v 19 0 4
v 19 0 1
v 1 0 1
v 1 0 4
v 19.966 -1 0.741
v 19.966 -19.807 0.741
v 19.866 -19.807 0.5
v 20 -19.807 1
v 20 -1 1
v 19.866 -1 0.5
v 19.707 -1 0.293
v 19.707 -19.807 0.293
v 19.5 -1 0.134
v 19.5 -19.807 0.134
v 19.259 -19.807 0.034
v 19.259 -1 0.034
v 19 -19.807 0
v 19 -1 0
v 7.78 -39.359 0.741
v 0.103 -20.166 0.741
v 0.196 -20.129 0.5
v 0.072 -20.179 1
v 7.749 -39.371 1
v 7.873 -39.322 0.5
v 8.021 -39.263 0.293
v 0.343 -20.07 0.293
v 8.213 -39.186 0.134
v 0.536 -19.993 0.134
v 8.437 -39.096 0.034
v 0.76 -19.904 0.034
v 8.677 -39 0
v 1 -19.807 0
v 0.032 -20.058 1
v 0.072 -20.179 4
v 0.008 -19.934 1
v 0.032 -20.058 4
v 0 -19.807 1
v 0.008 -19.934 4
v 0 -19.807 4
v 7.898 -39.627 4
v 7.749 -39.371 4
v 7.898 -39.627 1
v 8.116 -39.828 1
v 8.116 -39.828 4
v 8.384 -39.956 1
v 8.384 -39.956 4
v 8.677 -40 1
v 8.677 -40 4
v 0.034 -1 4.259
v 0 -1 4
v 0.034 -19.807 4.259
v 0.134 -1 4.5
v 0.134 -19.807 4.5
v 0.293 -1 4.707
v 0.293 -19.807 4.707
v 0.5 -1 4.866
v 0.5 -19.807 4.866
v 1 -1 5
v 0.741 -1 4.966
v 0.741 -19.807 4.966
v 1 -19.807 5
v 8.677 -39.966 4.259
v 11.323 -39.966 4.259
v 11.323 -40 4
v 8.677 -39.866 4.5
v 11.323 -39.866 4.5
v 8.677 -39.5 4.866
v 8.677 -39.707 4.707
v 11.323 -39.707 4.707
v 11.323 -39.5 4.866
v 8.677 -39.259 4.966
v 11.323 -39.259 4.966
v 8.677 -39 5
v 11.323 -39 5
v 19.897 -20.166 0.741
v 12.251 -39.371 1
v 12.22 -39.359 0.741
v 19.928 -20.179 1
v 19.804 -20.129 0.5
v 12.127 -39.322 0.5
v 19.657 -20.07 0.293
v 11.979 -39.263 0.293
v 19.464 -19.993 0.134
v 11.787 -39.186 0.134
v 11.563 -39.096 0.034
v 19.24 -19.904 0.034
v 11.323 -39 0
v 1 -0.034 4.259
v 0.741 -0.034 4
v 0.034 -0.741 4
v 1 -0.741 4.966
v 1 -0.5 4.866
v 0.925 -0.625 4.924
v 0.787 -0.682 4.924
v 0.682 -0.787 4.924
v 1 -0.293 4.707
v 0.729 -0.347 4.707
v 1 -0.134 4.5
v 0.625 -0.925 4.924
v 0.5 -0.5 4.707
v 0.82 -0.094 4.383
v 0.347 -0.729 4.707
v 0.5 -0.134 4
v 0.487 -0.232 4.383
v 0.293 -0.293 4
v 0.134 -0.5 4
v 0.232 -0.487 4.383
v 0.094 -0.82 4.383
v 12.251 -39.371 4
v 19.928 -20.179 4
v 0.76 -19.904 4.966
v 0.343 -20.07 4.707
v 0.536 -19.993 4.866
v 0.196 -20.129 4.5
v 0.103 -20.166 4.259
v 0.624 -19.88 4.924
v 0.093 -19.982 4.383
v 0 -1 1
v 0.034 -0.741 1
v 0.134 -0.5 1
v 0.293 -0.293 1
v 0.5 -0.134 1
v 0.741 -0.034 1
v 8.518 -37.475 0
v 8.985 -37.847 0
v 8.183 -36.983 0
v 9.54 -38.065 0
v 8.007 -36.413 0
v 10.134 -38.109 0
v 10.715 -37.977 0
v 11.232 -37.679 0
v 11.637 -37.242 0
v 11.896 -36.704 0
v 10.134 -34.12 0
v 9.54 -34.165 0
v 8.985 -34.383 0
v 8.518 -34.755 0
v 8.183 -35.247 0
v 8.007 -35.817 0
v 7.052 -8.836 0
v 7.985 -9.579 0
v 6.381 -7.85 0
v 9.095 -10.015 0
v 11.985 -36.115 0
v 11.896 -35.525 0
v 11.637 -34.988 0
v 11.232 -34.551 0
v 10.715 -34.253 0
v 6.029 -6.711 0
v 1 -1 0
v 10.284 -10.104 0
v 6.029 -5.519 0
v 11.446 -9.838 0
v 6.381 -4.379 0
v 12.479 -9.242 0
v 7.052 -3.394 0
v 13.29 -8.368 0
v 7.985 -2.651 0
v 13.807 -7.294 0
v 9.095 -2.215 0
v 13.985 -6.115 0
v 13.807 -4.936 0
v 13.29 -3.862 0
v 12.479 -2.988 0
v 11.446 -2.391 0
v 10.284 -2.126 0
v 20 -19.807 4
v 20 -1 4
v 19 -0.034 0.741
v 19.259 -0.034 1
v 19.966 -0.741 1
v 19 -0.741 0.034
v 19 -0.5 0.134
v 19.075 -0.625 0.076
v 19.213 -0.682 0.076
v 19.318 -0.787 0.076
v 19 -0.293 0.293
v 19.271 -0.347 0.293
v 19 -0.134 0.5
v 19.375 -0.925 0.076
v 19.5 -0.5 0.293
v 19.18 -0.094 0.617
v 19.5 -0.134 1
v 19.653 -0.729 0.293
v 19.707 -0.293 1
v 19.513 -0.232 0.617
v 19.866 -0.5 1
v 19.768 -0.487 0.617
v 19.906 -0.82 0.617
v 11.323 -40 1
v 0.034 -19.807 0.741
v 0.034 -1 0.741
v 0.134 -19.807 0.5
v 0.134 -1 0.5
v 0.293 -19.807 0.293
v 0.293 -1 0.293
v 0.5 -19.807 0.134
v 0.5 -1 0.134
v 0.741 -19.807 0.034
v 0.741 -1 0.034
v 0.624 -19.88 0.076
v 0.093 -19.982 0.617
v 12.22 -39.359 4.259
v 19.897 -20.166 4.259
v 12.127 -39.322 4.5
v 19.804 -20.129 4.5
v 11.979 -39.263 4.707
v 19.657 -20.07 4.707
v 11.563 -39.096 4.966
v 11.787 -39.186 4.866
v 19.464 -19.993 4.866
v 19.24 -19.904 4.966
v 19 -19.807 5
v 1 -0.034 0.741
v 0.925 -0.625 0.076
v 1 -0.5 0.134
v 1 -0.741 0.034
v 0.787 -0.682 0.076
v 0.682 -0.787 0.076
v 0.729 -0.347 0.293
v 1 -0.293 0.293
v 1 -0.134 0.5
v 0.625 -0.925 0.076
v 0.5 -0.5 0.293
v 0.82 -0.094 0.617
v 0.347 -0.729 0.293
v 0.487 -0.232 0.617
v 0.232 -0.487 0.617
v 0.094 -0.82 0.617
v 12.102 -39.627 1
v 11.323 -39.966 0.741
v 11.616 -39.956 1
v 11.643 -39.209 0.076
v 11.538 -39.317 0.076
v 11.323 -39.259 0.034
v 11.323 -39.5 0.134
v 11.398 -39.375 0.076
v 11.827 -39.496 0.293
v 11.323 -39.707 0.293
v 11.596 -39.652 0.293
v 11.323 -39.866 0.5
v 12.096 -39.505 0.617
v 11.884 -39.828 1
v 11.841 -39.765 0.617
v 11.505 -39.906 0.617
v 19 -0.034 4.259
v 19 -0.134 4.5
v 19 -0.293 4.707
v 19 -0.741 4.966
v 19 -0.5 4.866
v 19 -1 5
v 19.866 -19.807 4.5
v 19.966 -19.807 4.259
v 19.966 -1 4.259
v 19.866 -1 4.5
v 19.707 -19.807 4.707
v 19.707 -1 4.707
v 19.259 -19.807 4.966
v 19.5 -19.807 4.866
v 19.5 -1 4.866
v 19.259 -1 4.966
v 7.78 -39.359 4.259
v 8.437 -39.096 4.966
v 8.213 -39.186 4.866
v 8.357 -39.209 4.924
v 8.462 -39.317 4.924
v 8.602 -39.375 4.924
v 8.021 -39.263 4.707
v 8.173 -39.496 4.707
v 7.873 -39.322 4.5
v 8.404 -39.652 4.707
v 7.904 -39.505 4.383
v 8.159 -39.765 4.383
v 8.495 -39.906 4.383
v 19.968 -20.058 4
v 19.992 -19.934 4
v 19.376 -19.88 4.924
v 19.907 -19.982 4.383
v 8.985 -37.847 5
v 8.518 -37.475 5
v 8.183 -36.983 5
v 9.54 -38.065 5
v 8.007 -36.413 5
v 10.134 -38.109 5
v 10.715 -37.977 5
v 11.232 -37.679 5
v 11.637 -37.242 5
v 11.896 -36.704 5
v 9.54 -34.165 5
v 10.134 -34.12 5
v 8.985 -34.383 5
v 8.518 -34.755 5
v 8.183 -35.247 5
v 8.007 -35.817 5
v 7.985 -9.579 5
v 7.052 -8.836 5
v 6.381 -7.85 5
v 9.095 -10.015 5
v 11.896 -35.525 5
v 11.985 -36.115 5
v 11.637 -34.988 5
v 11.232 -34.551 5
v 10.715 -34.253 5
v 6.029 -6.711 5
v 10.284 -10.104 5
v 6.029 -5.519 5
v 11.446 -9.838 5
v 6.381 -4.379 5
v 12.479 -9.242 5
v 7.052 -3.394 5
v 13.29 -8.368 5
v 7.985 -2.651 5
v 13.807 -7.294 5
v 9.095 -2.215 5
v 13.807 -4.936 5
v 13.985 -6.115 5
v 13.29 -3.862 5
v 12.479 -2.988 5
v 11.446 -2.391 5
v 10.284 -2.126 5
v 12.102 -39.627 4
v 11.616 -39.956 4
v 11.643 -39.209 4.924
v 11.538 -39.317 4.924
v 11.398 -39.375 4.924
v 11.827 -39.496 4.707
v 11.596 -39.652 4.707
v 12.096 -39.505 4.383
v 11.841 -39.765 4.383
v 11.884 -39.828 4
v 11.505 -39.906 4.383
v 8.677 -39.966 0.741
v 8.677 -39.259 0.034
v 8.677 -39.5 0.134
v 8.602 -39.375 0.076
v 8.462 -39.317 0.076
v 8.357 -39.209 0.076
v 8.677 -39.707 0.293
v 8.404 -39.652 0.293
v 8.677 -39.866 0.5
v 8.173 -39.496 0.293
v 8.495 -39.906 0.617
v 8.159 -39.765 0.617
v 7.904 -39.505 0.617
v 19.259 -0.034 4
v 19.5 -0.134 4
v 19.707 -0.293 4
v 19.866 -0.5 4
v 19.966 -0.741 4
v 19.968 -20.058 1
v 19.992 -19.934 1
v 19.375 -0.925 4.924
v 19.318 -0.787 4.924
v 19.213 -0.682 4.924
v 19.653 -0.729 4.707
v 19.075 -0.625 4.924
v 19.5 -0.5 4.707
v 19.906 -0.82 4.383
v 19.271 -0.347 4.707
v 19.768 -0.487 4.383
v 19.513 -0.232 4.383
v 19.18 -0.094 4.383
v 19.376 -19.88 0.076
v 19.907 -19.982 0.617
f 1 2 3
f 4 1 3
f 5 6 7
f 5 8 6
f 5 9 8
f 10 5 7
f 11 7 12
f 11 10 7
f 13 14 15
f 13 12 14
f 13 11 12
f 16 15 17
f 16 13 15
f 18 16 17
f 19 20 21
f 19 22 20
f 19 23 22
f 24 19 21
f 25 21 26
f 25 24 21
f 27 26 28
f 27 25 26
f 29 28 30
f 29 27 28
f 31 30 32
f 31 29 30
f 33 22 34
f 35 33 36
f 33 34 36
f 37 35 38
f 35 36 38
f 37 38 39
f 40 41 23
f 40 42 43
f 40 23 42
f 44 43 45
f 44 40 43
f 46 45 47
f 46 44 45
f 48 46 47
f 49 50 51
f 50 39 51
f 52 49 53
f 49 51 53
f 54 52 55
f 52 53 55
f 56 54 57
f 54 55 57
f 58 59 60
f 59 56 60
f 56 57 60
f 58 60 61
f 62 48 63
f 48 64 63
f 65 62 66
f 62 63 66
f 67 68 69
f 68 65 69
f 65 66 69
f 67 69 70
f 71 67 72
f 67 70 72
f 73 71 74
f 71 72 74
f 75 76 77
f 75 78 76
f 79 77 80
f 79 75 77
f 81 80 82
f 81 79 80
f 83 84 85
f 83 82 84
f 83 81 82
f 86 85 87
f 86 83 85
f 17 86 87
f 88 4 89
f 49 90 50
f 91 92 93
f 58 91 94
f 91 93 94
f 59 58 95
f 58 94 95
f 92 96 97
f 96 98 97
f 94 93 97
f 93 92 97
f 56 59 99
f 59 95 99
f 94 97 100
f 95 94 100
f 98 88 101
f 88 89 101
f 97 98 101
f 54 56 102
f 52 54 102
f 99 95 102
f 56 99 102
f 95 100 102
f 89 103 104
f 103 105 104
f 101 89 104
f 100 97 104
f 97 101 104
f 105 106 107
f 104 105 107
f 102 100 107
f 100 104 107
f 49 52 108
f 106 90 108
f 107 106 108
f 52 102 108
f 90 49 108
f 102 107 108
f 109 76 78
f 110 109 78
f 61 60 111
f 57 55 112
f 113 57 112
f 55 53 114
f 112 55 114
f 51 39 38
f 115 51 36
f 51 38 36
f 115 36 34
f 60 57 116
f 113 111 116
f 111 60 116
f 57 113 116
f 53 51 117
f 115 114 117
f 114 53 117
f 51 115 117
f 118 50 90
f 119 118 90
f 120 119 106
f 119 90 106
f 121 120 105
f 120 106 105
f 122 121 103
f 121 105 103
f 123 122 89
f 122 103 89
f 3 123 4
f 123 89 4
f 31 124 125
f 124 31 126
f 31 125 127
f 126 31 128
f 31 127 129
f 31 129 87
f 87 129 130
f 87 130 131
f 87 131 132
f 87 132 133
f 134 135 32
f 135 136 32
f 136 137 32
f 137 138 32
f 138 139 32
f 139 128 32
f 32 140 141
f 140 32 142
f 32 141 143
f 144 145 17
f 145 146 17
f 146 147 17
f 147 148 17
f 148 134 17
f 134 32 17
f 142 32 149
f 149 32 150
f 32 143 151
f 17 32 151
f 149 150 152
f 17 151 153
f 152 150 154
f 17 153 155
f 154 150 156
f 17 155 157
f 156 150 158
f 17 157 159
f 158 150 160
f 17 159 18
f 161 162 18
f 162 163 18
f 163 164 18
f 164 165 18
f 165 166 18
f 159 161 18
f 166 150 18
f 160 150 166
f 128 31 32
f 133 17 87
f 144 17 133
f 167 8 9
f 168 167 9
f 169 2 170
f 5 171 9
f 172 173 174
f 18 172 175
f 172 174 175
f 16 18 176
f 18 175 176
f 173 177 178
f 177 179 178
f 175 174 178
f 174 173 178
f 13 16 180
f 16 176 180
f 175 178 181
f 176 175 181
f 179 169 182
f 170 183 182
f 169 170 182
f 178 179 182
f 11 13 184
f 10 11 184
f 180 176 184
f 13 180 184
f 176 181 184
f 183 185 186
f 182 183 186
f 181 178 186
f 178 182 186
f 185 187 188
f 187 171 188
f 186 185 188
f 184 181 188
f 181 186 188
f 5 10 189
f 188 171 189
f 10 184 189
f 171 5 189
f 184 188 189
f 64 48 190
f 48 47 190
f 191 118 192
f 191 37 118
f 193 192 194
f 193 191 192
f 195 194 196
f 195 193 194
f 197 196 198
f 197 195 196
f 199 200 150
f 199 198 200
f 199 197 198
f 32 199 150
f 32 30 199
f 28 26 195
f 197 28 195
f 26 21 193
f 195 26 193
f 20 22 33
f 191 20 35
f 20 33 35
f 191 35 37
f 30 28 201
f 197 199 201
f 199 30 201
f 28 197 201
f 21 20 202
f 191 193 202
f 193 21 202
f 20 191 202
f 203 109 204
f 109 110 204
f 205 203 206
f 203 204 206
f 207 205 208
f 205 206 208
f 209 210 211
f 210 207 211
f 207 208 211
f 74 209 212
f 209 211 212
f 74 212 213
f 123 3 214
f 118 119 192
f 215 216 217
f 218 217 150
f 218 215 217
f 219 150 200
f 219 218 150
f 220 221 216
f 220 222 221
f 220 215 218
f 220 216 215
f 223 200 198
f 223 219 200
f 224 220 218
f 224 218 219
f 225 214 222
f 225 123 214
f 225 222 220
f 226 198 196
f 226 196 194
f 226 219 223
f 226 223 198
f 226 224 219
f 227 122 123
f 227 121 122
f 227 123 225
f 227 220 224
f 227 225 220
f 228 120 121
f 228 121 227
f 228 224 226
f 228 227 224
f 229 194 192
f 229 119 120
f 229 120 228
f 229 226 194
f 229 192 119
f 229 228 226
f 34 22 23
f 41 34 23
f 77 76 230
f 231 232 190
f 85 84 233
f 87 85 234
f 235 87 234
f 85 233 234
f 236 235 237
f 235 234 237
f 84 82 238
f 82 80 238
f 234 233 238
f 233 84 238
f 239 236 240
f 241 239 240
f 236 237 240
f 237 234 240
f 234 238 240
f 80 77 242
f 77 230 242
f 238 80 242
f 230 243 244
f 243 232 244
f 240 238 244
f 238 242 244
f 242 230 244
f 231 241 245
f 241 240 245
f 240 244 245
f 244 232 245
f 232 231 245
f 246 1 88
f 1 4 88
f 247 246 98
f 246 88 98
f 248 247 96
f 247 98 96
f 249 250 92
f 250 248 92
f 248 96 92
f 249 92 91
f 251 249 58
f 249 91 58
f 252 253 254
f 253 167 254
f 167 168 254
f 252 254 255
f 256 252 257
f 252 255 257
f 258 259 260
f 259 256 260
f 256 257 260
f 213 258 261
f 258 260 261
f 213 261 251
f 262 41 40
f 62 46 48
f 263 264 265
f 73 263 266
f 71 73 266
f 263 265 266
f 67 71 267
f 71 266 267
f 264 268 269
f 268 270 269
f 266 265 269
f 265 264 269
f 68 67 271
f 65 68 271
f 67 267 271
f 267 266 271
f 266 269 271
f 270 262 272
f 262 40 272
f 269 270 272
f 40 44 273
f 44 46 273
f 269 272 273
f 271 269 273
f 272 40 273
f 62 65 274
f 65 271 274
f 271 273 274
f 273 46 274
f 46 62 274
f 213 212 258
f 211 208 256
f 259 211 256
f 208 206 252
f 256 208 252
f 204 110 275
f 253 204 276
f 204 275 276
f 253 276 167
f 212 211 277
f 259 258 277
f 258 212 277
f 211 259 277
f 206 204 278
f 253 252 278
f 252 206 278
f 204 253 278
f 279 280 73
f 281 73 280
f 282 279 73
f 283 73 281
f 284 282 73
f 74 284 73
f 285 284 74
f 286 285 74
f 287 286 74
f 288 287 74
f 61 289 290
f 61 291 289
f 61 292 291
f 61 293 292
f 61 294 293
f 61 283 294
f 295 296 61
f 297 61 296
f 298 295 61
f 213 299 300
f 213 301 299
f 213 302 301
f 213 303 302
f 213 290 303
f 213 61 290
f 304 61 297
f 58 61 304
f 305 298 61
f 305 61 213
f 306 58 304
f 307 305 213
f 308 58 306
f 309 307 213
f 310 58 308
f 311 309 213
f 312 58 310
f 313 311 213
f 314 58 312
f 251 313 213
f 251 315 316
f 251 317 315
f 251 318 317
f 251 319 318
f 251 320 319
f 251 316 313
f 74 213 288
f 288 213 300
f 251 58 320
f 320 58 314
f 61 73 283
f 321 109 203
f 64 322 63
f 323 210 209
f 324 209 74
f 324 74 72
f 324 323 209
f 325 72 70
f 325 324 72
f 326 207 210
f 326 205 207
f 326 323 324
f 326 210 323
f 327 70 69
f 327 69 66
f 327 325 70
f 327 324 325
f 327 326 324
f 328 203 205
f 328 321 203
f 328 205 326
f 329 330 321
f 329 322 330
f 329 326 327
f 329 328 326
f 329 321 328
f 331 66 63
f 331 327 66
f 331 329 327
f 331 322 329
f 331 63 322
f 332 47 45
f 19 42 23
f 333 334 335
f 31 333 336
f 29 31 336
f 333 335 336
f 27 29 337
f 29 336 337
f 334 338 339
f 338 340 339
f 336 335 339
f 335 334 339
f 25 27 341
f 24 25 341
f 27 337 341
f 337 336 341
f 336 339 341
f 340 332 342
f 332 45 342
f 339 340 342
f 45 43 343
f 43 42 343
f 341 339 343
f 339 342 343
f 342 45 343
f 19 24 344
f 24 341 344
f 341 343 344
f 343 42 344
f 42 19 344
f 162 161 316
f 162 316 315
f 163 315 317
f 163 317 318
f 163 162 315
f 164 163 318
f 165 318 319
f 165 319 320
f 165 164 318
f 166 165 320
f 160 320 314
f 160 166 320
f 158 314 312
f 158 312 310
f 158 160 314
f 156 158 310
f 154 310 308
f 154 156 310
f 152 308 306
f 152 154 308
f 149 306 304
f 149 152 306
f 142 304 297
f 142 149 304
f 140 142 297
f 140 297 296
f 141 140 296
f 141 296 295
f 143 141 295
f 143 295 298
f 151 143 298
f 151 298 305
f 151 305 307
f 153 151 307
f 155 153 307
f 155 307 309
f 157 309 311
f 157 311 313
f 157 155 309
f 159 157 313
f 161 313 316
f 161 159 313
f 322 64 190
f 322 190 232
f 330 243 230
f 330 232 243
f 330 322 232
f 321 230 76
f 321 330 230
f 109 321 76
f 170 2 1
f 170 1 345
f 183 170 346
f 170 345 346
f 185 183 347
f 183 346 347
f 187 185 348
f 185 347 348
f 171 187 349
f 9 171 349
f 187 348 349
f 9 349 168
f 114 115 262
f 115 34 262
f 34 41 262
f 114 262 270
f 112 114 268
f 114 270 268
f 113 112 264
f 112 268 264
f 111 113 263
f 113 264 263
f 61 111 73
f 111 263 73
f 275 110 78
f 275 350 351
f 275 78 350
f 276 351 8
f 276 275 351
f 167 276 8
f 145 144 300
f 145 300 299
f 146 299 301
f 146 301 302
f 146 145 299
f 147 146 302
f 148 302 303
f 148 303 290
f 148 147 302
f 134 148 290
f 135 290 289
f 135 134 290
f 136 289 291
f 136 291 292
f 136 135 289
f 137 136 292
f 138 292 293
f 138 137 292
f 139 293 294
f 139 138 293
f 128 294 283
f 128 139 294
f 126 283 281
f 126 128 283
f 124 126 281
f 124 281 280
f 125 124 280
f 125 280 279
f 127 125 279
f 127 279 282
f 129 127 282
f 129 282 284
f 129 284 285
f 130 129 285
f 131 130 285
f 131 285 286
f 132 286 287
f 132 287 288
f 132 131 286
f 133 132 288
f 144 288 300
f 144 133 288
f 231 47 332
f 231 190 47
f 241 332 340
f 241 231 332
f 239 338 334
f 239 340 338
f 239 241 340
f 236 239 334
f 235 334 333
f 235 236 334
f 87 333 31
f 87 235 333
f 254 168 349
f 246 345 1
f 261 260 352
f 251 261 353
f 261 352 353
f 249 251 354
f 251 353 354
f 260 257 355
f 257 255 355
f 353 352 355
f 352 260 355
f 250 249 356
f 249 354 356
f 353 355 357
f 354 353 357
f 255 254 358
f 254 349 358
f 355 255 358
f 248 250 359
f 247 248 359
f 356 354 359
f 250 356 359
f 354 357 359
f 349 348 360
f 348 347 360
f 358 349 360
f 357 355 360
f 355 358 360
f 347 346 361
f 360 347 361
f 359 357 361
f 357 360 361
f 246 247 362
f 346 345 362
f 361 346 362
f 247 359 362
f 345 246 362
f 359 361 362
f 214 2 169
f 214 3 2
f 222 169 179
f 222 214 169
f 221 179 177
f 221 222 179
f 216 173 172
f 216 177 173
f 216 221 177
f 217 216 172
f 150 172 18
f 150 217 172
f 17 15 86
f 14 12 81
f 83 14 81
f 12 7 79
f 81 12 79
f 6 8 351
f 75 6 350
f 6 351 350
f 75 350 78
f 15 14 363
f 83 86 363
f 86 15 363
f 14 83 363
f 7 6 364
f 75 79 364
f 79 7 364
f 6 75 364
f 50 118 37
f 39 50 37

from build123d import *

# Parameters (mm, degrees)
SKETCH1_R           = 4
SKETCH1_R_2         = 2
BOSS_EXTRUDE1_DEPTH = 5
FILLET1_R           = 1


with BuildPart() as part:
    # Sketch1 → Boss-Extrude1 (new body)
    with BuildSketch(Plane.XY):
        Polygon((0, -20), (8, -40), (12, -40), (20, -20), (20, 0), (0, 0), align=None)
        with Locations((9.984598527, -6.114863432)):
            Circle(SKETCH1_R, mode=Mode.SUBTRACT)
        with Locations((9.984598527, -36.114863432)):
            Circle(SKETCH1_R_2, mode=Mode.SUBTRACT)
    extrude(amount=BOSS_EXTRUDE1_DEPTH)

    # Fillet1
    fillet1_edges = [part.edges().sort_by_distance(p)[0] for p in [
        (10, -40, 5),
        (0, 0, 2.5),
        (20, 0, 2.5),
        (20, -20, 2.5),
        (12, -40, 2.5),
        (8, -40, 2.5),
        (0, -20, 2.5),
        (16, -30, 5),
        (20, -10, 5),
        (10, 0, 5),
        (0, -10, 5),
        (10, 0, 0),
        (20, -10, 0),
        (16, -30, 0),
        (4, -30, 5),
        (10, -40, 0),
        (4, -30, 0),
        (0, -10, 0),
    ]]
    fillet(fillet1_edges, radius=FILLET1_R)


solid = part.part
